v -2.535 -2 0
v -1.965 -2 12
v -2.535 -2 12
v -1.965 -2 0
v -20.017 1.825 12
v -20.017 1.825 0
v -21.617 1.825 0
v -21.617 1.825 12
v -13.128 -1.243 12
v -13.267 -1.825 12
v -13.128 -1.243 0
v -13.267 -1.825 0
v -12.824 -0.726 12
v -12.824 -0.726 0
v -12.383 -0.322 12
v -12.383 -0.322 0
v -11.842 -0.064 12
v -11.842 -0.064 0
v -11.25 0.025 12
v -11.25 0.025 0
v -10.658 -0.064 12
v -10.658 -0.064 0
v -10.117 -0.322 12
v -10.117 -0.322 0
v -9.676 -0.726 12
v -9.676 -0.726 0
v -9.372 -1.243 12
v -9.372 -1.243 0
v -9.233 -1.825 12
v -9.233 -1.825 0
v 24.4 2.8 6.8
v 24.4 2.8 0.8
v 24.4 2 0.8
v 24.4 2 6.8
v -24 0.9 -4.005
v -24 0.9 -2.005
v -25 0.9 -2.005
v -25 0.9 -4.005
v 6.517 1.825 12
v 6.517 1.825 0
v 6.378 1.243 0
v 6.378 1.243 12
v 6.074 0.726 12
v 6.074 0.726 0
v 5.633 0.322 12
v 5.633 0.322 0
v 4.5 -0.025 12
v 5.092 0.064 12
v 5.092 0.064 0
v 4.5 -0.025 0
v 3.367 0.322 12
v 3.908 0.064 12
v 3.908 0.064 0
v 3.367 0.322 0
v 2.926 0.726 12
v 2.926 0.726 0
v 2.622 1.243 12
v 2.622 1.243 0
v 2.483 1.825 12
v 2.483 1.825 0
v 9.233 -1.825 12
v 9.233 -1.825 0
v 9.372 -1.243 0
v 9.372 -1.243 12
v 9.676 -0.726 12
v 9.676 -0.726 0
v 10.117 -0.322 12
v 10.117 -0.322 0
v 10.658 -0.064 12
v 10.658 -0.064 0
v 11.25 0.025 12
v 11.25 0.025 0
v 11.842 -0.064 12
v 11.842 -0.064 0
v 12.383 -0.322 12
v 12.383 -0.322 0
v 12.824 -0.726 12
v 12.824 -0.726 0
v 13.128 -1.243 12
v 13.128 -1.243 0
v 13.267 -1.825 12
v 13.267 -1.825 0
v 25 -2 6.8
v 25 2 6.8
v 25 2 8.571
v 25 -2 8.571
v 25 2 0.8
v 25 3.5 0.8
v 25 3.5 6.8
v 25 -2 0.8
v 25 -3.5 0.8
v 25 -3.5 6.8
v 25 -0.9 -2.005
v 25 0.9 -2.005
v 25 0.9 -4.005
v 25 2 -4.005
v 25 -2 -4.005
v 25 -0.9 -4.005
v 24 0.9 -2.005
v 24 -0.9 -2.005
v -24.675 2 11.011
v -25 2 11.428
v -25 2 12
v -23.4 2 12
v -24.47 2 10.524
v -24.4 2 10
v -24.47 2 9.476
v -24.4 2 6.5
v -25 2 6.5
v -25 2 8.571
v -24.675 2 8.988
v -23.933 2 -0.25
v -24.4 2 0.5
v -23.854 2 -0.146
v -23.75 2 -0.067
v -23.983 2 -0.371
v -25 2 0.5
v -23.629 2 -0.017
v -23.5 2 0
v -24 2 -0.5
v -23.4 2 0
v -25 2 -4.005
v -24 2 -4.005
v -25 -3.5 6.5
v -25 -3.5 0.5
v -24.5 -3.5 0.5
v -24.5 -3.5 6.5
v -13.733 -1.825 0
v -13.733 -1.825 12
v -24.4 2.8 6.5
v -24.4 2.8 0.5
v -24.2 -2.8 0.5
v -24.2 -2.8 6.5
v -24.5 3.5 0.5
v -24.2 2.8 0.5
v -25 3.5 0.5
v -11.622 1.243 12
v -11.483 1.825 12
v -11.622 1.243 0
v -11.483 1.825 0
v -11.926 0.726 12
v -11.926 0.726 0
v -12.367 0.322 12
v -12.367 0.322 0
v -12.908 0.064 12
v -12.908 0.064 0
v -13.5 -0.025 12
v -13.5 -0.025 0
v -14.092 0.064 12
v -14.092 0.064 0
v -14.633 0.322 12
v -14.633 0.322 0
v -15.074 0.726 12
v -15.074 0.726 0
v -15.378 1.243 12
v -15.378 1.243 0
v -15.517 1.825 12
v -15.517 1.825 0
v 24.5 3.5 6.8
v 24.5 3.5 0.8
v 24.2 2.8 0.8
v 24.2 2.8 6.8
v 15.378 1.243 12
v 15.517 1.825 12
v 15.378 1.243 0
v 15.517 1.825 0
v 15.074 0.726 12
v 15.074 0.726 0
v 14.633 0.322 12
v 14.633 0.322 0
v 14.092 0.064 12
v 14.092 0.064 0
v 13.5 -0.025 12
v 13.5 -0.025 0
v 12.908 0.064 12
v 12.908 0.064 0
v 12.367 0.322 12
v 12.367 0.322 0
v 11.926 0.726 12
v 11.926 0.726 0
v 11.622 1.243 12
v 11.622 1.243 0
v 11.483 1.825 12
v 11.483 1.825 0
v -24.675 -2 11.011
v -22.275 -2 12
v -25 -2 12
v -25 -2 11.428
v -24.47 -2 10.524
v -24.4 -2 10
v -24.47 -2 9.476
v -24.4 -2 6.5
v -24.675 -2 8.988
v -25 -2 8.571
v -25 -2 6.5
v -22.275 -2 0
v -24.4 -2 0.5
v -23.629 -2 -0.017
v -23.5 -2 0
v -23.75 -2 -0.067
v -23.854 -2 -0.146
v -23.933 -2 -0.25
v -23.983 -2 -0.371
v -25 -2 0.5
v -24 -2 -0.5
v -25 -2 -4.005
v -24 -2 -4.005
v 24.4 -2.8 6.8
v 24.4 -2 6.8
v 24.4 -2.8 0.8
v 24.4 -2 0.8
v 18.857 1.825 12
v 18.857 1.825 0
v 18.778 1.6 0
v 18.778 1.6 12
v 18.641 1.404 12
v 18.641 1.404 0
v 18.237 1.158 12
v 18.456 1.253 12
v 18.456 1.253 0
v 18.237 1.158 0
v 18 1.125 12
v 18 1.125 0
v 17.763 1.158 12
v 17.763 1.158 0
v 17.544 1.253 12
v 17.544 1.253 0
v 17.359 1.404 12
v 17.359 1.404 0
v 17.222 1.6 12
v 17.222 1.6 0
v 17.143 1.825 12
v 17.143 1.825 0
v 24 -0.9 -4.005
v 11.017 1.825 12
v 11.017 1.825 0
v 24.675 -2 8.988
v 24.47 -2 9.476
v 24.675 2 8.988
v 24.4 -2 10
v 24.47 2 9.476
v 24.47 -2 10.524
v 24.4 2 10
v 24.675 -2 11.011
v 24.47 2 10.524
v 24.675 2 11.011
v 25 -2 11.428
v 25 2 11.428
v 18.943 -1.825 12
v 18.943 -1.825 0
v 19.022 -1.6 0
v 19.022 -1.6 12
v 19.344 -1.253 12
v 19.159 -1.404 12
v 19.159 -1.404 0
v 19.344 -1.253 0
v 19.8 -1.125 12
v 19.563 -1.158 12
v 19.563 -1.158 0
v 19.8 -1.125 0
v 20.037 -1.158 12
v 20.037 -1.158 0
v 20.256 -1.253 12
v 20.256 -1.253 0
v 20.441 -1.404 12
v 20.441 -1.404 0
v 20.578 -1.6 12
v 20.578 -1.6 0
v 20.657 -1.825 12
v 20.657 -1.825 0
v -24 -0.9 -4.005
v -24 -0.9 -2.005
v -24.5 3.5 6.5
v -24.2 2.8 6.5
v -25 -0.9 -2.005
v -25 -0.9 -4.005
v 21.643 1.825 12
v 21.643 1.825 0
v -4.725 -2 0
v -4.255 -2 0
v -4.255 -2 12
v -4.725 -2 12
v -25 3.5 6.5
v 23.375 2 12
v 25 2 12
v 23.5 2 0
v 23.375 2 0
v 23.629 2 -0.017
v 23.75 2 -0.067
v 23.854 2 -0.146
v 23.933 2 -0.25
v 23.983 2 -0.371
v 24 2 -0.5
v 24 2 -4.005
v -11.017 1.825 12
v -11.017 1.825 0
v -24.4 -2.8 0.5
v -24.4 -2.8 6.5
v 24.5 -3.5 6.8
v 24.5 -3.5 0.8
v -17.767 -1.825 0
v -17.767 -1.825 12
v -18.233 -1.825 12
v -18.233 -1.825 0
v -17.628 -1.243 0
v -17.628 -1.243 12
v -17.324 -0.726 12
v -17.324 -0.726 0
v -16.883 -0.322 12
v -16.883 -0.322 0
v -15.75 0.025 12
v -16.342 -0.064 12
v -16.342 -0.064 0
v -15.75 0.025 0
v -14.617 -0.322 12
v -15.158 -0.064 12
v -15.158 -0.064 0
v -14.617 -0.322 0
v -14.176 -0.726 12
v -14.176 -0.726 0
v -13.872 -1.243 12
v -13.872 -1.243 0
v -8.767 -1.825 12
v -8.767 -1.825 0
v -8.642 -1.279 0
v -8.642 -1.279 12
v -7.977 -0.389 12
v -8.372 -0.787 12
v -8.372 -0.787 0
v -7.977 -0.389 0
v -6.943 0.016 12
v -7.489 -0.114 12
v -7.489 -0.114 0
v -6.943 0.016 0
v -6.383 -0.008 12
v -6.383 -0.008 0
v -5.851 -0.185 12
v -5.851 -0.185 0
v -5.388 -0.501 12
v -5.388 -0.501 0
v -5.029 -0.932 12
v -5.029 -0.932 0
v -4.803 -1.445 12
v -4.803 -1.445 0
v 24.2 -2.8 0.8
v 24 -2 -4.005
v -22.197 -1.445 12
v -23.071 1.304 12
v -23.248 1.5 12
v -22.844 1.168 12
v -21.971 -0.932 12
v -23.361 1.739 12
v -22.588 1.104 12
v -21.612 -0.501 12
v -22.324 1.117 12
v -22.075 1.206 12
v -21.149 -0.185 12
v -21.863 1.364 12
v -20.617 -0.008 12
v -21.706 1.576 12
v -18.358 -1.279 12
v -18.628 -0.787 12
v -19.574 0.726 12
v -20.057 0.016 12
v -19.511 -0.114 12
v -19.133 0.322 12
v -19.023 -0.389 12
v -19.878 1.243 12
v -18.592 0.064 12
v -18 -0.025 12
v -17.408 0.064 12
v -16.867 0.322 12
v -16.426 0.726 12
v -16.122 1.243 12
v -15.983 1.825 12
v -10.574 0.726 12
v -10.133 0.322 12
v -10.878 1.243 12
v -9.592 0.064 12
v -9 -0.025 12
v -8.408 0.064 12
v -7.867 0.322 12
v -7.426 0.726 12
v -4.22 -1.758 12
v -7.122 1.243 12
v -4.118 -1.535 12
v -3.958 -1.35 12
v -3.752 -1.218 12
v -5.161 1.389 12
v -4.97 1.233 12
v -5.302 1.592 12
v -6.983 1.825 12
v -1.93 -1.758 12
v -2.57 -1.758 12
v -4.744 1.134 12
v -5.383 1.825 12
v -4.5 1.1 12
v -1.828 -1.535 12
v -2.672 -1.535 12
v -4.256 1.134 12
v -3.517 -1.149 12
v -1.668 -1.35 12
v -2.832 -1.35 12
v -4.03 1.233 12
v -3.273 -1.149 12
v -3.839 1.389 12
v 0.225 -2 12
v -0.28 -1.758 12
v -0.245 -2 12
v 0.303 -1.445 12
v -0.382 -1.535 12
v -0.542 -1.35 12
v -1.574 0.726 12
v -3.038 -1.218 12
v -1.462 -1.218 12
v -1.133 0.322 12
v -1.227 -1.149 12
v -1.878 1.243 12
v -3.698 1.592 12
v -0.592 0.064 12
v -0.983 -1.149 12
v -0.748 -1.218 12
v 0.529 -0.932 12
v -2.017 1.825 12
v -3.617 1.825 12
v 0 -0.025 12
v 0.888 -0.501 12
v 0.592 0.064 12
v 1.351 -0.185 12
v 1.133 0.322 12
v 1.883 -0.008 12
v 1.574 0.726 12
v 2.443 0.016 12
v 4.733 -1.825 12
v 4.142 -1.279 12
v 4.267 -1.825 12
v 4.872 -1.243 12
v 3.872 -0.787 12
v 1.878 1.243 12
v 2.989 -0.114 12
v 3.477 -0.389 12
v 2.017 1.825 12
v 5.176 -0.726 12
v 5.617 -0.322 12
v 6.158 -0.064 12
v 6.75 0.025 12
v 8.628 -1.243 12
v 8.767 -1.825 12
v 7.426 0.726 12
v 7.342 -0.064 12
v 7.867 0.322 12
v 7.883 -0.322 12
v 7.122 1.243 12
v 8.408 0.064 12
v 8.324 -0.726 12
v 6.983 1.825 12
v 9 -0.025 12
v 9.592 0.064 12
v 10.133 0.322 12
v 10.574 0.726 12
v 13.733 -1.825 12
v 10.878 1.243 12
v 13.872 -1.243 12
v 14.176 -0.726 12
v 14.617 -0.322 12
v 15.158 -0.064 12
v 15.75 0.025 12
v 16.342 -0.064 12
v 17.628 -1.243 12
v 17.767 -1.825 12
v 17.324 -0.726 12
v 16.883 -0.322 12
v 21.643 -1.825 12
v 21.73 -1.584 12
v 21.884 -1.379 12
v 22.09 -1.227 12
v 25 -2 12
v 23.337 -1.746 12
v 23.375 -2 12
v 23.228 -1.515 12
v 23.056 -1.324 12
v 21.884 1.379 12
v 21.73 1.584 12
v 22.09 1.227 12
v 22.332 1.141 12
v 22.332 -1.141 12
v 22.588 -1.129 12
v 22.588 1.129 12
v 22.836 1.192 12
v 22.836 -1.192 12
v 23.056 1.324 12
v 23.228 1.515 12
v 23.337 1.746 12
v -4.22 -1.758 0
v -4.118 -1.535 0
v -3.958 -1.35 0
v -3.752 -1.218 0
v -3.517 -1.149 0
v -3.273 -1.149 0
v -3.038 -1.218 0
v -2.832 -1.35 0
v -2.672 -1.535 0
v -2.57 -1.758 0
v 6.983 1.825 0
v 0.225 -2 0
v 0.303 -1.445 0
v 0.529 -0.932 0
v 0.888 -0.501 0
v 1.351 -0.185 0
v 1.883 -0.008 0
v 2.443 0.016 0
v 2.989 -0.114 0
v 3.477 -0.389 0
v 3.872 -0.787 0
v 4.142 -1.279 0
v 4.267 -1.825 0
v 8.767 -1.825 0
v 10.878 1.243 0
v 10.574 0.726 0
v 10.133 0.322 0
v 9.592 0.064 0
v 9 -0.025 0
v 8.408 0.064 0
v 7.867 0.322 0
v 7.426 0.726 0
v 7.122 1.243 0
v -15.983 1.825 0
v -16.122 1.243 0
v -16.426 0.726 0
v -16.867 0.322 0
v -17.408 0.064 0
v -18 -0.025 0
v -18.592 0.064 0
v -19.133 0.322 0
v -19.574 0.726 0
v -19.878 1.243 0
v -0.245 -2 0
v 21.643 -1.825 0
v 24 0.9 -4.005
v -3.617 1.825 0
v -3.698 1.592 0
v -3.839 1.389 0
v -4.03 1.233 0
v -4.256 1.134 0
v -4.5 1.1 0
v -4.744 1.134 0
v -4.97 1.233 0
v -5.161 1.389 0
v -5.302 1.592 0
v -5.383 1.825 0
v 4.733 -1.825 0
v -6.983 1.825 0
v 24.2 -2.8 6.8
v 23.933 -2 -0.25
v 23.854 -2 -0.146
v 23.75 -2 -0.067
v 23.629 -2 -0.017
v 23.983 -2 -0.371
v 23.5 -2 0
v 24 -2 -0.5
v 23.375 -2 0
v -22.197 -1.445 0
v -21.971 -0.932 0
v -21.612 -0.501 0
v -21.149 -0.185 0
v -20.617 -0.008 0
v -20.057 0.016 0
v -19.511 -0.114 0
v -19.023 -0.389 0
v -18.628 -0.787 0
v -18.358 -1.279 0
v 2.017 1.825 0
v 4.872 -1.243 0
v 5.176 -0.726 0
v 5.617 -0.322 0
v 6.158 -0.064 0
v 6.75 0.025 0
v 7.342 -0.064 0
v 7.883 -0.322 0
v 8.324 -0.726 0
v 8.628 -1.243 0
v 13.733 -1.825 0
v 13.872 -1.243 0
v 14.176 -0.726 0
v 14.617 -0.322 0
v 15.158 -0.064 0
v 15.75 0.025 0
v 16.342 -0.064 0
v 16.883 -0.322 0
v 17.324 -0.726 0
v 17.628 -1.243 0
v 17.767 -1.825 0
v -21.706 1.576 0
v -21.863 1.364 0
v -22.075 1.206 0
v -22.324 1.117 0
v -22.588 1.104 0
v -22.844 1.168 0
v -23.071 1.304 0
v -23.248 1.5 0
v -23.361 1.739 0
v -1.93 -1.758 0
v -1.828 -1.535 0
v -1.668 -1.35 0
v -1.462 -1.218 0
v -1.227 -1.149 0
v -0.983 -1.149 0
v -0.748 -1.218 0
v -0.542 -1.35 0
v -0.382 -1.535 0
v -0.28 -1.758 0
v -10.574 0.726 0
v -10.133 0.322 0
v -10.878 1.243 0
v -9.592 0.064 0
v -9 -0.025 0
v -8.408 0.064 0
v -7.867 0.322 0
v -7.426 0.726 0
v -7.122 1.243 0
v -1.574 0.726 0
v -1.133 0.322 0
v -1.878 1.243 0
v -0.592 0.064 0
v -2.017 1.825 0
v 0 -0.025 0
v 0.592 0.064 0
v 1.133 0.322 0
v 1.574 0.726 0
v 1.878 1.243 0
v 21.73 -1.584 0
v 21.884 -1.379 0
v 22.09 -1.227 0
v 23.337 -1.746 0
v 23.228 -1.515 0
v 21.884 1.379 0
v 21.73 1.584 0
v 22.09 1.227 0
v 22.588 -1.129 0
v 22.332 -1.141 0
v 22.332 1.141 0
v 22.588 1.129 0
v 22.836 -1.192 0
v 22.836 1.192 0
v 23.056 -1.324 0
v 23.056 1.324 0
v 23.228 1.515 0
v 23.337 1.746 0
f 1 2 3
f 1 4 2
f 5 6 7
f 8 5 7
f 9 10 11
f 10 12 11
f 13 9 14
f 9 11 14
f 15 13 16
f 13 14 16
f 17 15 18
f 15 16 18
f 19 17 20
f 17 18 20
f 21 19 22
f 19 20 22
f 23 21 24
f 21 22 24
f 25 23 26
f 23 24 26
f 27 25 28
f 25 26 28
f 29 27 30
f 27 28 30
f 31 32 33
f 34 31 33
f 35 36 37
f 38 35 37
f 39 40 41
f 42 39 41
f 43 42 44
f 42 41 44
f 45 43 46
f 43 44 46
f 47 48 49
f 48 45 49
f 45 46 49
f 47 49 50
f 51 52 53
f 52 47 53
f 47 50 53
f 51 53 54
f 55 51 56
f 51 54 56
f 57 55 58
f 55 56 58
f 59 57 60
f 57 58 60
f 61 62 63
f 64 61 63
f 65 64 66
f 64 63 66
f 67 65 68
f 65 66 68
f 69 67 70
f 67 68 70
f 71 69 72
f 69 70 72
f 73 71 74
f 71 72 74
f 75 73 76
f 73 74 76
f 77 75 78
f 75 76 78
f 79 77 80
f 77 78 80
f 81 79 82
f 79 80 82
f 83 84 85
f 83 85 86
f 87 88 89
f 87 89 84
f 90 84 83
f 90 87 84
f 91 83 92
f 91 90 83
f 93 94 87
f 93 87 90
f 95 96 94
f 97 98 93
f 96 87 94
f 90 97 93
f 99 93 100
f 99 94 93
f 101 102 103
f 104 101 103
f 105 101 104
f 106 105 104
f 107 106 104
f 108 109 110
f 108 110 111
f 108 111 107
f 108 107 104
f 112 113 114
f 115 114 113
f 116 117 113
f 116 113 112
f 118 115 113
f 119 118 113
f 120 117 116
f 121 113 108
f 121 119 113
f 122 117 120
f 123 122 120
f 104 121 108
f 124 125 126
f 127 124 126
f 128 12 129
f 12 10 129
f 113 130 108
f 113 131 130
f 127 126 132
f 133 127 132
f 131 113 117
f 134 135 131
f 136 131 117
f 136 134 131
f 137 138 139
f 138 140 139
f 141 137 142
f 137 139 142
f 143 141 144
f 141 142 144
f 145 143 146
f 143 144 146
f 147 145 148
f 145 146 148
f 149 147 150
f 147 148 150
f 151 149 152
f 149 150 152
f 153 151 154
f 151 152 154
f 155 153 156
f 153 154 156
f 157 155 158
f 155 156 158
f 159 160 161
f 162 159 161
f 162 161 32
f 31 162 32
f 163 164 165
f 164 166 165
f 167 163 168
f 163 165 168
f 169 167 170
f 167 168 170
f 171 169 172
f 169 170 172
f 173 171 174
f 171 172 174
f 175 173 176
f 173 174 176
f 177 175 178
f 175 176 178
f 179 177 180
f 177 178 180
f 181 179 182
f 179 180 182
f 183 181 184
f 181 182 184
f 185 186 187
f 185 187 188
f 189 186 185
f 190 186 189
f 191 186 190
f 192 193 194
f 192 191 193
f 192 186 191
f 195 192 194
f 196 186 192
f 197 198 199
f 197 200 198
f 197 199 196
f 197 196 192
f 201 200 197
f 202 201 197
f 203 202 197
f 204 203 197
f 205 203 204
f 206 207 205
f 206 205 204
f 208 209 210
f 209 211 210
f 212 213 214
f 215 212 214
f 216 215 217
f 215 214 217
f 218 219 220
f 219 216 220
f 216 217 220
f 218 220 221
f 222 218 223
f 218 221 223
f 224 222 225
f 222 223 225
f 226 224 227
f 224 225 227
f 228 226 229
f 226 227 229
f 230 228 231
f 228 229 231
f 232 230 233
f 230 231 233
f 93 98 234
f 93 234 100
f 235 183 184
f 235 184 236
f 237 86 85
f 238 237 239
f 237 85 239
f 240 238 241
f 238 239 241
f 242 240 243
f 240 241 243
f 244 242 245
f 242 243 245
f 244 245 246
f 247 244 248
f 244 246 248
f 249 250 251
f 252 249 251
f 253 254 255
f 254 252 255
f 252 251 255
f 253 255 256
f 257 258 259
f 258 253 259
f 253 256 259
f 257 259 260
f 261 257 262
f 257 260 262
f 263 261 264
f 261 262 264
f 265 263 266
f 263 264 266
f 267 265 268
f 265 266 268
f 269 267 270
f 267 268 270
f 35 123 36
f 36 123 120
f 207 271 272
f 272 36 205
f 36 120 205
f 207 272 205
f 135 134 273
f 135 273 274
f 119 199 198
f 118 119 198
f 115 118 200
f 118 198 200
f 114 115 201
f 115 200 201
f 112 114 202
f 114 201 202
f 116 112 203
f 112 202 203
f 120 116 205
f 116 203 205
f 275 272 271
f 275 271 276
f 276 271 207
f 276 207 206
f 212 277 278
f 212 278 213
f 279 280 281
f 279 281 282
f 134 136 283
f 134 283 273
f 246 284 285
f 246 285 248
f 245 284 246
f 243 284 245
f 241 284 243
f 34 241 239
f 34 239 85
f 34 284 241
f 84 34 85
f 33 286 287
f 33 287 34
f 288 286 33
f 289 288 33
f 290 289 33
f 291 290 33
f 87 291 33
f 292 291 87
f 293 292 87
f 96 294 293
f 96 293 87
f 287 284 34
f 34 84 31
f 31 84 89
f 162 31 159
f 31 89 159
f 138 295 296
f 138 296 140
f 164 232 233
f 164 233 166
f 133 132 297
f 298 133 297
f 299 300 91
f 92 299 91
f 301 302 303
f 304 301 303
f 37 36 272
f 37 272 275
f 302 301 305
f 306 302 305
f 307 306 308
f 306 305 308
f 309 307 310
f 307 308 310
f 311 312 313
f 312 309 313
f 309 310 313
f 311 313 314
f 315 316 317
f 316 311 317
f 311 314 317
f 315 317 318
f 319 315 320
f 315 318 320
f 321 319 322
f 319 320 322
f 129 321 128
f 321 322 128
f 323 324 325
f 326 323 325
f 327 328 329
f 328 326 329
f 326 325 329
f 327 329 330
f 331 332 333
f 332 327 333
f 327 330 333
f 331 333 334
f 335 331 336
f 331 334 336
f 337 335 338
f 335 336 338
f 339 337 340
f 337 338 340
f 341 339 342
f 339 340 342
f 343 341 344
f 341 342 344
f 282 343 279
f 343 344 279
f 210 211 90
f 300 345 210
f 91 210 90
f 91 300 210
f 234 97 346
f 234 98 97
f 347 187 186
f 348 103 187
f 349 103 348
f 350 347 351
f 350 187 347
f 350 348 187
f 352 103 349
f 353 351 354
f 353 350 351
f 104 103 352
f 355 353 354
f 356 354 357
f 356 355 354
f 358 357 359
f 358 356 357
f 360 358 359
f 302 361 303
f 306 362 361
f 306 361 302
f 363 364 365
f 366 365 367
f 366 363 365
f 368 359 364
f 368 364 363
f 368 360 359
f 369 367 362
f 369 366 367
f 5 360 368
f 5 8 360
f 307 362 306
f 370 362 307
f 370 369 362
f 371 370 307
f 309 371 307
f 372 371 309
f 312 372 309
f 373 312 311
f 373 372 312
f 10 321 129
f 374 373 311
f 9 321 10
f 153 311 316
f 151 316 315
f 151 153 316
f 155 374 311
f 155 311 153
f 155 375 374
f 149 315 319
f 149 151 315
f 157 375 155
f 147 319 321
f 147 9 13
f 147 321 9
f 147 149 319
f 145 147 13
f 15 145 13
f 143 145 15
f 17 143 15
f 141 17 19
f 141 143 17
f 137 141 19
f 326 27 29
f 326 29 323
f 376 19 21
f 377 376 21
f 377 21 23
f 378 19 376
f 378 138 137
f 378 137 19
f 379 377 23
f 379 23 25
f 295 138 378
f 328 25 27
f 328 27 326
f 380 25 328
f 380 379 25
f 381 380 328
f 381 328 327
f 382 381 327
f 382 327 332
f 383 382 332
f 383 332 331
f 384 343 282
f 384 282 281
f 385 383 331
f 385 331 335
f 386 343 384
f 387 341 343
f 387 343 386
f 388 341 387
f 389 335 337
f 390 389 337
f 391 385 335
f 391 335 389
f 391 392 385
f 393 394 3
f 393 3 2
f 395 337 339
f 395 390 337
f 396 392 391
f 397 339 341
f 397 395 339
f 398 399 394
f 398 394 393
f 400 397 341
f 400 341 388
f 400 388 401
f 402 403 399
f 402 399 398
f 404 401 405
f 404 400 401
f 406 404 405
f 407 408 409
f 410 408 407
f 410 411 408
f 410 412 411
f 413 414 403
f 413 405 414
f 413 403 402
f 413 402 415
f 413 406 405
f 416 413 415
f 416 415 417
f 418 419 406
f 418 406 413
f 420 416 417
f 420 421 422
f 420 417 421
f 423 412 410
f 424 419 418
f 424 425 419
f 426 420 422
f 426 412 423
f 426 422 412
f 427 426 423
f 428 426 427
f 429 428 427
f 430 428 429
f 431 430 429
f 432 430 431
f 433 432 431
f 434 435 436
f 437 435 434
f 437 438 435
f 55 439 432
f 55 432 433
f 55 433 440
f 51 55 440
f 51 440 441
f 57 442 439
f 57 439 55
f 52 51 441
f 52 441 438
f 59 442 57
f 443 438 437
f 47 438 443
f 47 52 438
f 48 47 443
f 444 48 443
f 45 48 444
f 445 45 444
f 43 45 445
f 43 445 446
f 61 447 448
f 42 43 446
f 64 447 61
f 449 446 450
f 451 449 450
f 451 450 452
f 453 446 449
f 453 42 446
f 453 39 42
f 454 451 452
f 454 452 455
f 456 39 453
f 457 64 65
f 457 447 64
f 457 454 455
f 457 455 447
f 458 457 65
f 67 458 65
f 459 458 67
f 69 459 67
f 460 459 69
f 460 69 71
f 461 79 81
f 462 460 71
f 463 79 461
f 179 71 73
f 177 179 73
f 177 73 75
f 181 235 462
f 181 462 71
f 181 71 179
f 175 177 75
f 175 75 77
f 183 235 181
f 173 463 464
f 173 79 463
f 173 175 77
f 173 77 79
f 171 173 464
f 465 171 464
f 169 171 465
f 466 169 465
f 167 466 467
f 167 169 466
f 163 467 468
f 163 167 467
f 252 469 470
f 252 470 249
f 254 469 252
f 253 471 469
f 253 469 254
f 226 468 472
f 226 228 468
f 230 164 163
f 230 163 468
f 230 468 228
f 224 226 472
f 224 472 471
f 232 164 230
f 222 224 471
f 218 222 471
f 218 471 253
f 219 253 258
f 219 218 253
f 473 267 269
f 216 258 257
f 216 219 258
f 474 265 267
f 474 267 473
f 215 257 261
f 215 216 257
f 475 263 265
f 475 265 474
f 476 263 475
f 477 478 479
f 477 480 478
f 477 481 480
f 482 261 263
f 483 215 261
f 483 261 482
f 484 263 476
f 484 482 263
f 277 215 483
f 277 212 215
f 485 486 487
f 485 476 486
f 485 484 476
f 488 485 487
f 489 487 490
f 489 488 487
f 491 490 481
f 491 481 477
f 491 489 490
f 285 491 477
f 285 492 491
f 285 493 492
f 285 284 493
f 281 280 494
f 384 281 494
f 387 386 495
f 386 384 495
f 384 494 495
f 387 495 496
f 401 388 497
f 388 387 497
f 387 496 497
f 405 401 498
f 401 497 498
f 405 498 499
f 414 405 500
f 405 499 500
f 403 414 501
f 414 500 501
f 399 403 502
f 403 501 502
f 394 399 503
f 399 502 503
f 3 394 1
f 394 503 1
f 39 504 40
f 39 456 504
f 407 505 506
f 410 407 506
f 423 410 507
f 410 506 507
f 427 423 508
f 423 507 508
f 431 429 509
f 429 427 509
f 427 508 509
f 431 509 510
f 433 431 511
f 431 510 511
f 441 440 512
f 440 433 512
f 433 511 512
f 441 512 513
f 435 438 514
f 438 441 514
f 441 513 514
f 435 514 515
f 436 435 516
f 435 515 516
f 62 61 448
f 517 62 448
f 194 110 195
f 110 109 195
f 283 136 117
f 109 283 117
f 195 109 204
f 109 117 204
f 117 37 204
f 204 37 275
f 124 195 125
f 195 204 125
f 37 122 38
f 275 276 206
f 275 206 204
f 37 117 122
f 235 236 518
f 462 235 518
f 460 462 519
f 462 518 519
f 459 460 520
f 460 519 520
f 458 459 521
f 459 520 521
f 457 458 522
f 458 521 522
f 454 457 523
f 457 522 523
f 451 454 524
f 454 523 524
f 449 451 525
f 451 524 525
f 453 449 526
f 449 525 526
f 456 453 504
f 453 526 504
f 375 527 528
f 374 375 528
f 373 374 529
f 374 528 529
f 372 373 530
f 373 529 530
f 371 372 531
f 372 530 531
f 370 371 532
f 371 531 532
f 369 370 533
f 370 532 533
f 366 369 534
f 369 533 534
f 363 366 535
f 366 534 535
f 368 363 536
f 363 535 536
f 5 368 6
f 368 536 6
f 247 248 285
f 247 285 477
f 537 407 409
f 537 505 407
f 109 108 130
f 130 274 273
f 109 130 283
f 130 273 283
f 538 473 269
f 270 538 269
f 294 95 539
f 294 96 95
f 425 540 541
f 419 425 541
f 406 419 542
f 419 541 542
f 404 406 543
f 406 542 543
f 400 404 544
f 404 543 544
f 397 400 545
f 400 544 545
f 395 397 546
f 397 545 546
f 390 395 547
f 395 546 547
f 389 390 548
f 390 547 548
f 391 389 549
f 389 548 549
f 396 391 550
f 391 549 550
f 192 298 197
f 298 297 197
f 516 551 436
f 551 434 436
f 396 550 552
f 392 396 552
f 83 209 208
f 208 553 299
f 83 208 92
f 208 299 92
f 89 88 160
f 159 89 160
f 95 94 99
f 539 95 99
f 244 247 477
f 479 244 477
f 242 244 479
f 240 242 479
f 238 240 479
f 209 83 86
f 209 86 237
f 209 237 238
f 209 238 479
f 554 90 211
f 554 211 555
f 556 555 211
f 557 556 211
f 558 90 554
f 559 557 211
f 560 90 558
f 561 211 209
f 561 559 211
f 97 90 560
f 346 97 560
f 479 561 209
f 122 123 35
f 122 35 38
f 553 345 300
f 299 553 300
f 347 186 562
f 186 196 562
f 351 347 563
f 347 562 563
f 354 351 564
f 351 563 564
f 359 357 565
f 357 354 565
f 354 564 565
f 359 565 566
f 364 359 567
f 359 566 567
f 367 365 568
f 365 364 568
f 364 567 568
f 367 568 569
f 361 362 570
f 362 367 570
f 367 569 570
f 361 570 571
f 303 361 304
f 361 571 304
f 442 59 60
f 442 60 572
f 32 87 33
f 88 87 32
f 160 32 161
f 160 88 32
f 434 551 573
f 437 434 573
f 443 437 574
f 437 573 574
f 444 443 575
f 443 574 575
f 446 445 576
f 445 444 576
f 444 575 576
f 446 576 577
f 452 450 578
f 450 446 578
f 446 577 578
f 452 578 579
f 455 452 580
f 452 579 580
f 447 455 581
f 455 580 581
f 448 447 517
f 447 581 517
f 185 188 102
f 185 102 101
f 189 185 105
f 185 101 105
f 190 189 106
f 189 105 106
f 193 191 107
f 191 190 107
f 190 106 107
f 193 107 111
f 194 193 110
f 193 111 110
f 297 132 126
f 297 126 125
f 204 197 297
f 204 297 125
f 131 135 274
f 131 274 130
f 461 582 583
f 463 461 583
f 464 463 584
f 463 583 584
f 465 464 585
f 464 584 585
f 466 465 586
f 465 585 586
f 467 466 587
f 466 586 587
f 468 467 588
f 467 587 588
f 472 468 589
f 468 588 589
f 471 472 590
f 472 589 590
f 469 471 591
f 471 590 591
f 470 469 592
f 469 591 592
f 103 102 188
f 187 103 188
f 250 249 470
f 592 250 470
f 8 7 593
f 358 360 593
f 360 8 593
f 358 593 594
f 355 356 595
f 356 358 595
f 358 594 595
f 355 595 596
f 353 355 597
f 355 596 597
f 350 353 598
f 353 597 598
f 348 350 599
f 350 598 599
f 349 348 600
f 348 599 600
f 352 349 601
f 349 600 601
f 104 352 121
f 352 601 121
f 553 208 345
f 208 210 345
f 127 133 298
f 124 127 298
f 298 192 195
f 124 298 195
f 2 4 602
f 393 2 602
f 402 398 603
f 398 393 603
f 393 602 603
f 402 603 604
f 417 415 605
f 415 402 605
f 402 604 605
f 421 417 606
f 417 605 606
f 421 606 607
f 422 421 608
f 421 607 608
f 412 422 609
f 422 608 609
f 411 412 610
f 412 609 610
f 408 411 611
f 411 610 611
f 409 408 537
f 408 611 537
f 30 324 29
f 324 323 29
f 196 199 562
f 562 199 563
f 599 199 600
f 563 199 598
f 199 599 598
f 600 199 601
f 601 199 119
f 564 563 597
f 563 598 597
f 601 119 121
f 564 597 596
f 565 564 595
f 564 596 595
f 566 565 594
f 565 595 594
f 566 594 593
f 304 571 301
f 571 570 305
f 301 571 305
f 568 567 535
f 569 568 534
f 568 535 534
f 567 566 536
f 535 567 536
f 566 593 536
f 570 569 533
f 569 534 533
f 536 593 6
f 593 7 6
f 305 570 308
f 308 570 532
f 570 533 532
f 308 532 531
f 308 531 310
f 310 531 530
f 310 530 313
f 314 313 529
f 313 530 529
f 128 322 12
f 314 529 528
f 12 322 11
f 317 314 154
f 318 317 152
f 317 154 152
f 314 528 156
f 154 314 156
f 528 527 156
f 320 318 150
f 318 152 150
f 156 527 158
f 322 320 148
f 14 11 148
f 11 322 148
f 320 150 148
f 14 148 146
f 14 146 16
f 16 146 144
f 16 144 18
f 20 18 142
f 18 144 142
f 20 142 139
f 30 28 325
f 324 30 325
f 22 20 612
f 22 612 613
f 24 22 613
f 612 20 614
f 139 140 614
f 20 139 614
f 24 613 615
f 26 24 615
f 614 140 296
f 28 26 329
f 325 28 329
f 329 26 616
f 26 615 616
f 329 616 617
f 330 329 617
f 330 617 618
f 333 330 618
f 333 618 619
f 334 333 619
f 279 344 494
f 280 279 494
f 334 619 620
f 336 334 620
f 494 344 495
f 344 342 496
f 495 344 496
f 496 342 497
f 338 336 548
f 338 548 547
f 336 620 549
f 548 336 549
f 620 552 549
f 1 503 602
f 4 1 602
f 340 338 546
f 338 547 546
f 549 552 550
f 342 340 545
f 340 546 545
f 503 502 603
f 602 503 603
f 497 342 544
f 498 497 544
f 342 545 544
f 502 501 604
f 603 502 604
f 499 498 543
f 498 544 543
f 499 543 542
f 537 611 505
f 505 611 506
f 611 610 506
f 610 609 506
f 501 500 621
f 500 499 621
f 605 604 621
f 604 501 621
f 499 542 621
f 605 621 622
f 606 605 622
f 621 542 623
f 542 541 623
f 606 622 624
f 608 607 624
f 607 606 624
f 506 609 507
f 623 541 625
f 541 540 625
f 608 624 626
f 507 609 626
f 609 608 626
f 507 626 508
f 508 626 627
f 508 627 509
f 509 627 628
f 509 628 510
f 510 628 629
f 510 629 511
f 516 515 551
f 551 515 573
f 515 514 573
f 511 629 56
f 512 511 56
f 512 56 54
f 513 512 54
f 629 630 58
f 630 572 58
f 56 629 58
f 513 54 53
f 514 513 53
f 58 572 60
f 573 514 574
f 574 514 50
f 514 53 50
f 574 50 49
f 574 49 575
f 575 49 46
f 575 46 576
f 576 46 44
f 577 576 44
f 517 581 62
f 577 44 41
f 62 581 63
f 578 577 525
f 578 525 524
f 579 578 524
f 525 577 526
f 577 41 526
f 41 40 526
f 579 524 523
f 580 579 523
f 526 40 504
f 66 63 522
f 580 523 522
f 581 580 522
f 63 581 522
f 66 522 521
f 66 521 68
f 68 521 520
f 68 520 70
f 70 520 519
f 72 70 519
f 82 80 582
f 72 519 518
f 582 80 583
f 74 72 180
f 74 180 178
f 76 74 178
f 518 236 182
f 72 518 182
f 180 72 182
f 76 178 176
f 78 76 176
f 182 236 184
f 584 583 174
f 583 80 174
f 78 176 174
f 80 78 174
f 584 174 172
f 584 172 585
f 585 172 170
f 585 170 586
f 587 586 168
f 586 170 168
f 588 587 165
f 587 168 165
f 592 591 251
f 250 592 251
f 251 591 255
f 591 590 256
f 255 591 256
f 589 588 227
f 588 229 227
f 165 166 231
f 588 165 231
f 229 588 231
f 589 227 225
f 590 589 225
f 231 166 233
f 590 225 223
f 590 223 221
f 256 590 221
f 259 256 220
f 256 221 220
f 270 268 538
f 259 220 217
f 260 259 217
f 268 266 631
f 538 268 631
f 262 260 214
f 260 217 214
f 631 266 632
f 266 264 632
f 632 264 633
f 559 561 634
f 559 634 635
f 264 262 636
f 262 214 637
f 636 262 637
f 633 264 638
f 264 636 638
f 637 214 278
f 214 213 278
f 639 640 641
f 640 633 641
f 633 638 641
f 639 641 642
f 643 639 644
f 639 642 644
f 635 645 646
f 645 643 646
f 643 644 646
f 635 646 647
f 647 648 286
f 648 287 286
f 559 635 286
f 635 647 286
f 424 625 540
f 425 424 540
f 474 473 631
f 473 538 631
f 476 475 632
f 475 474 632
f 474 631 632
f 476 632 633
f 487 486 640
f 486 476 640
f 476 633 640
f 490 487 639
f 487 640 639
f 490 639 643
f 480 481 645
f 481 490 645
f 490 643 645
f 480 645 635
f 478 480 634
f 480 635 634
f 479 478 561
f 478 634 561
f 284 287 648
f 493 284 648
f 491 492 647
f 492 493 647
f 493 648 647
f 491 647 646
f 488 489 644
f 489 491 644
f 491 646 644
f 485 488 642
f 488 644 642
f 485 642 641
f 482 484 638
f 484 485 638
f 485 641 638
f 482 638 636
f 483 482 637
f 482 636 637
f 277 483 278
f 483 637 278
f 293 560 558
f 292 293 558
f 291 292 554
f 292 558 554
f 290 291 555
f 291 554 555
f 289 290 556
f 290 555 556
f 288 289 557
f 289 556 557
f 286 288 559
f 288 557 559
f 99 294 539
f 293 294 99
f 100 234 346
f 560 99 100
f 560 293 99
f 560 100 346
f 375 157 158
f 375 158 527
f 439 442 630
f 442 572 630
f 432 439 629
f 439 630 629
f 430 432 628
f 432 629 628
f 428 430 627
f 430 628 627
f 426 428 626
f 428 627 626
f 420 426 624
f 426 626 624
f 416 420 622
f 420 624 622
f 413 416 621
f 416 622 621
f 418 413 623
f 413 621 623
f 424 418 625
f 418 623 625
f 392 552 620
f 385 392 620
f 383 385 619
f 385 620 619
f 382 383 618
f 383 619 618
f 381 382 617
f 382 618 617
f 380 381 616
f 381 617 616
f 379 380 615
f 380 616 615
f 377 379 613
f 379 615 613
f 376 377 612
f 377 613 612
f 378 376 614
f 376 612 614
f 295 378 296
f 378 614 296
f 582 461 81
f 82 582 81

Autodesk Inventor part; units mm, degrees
sketch "Sketch1" plane through (0, 0, 0) normal (0, 0, 1) x (1, 0, 0)
  line L0 (-25, 2) -> (-25, -2)
  line L1 (0, 0.3189) -> (0, -1.0844) construction
  line L2 (-25, 2) -> (25, 2)
  line L3 (25, 2) -> (25, -2)
  line L4 (25, -2) -> (-25, -2)
  line L5 (-1.8046, 0) -> (4.5195, 0) construction
  arc A0 (-23.4, 2) -> (-21.6, 2) centre (-22.5, 2) ccw
  arc A1 (-20.025, 2) -> (-15.975, 2) centre (-18, 2) ccw
  arc A2 (-15.525, 2) -> (-11.475, 2) centre (-13.5, 2) ccw
  arc A3 (-11.025, 2) -> (-6.975, 2) centre (-9, 2) ccw
  arc A4 (-5.4, 2) -> (-3.6, 2) centre (-4.5, 2) ccw
  arc A5 (-2.025, 2) -> (2.025, 2) centre (0, 2) ccw
  arc A6 (2.475, 2) -> (6.525, 2) centre (4.5, 2) ccw
  arc A7 (6.975, 2) -> (11.025, 2) centre (9, 2) ccw
  arc A8 (11.475, 2) -> (15.525, 2) centre (13.5, 2) ccw
  arc A9 (17.125, 2) -> (18.875, 2) centre (18, 2) ccw
  arc A10 (21.625, 2) -> (23.375, 2) centre (22.5, 2) ccw
  arc A11 (-18.225, -2) -> (-22.275, -2) centre (-20.25, -2) ccw
  arc A12 (-13.725, -2) -> (-17.775, -2) centre (-15.75, -2) ccw
  arc A13 (-9.225, -2) -> (-13.275, -2) centre (-11.25, -2) ccw
  arc A14 (-4.725, -2) -> (-8.775, -2) centre (-6.75, -2) ccw
  arc A15 (-2.535, -2) -> (-4.255, -2) centre (-3.395, -2) ccw
  arc A16 (-0.245, -2) -> (-1.965, -2) centre (-1.105, -2) ccw
  arc A17 (4.275, -2) -> (0.225, -2) centre (2.25, -2) ccw
  arc A18 (8.775, -2) -> (4.725, -2) centre (6.75, -2) ccw
  arc A19 (13.275, -2) -> (9.225, -2) centre (11.25, -2) ccw
  arc A20 (17.775, -2) -> (13.725, -2) centre (15.75, -2) ccw
  arc A21 (20.675, -2) -> (18.925, -2) centre (19.8, -2) ccw
  arc A22 (23.375, -2) -> (21.625, -2) centre (22.5, -2) ccw
  point P0 (0, 0)
  dimension "d0" = 4
  dimension "d1" = 50
  dimension "d2" = 2.5
  dimension "d3" = 4.5
  dimension "d4" = 4.5
  dimension "d5" = 4.5
  dimension "d6" = 4.5
  dimension "d7" = 4.5
  dimension "d8" = 4.5
  dimension "d10" = 4.5
  dimension "d11" = 4.5
  dimension "d12" = 4.5
  dimension "d13" = 4.5
  dimension "d14" = 1.8
  dimension "d15" = 4.05
  dimension "d16" = 4.05
  dimension "d17" = 4.05
  dimension "d18" = 1.8
  dimension "d19" = 4.05
  dimension "d20" = 4.05
  dimension "d21" = 4.05
  dimension "d22" = 4.05
  dimension "d23" = 1.75
  dimension "d24" = 1.75
  dimension "d25" = 4.05
  dimension "d27" = 4.5
  dimension "d28" = 4.5
  dimension "d29" = 4.5
  dimension "d30" = 3.355
  dimension "d31" = 2.29
  dimension "d32" = 3.355
  dimension "d33" = 4.5
  dimension "d34" = 4.5
  dimension "d35" = 4.5
  dimension "d37" = 1.75
  dimension "d38" = 4.05
  dimension "d39" = 4.05
  dimension "d40" = 4.05
  dimension "d41" = 4.05
  dimension "d42" = 1.72
  dimension "d43" = 1.72
  dimension "d44" = 4.05
  dimension "d45" = 4.05
  dimension "d46" = 4.05
  dimension "d47" = 1.75
  dimension "d48" = 2.7
  dimension "d136" = 2.5
  dimension "d143" = 4.05
extrude "Extrusion1" add sketch "Sketch1" along normal blind 12 contours L2 A0 A1 A2 A3 A4 A5 A6 A7 A8 A9 A10 L3 L4 A22 A21 A20 A19 A18 A17 A16 A15 A14 A13 A12 A11 L0
sketch "Sketch2" plane through (23.375, 2, 0) normal (0, 1, 0) x (1, 0, 0)
  circle A0 centre (3.025, -9.9997) radius 2
  line L0 (1.625, 0) -> (1.625, -12) projected
  line L1 (1.625, -12) -> (1.625, -11.428)
  point P0 (-23.375, 0)
  dimension "d51" = 4
  dimension "d52" = 0.572
  dimension "d55" = 1.4
extrude "Extrusion2" cut sketch "Sketch2" against normal blind 12.5
sketch "Sketch3" plane through (-25, 2, 0) normal (0, 1, 0) x (1, 0, 0)
  circle A0 centre (-1.4, -9.9997) radius 2
  line L0 (0, 0) -> (0, -12) projected
  line L1 (0, -12) -> (0, -11.428)
  point P0 (25, 0)
  dimension "d58" = 4
  dimension "d59" = 0.572
  dimension "d60" = 1.4
extrude "Extrusion3" cut sketch "Sketch3" against normal blind 12.5
sketch "Sketch4" plane through (0, 0, 12) normal (0, 0, 1) x (1, 0, 0)
  line L0 (-22.4782, 2) -> (21.8218, 2)
  line L1 (21.8218, 2) -> (21.8218, 1.825)
  line L2 (21.8218, 1.825) -> (-22.4782, 1.825)
  line L3 (-22.4782, 1.825) -> (-22.4782, 2)
  line L4 (-20.025, 2) -> (-21.6, 2) projected
  line L5 (-25, 2) -> (-25, -2) projected
  line L6 (13.275, -2) -> (13.725, -2) projected
  line L7 (-21.5, -2) -> (-8, -2)
  line L8 (-8, -2) -> (-8, -1.825)
  line L9 (-8, -1.825) -> (-21.5, -1.825)
  line L10 (-21.5, -1.825) -> (-21.5, -2)
  line L11 (0.89, -2) -> (21.8842, -2)
  line L12 (21.8842, -2) -> (21.8842, -1.825)
  line L13 (21.8842, -1.825) -> (0.89, -1.825)
  line L14 (0.89, -1.825) -> (0.89, -2)
  line L15 (-13.725, -2) -> (-13.275, -2) projected
  line L16 (25, -2) -> (25, 2) projected
  point P0 (0, 0)
  point P1 (-20.8125, 2)
  point P2 (13.5, -2)
  point P3 (-13.5, -2)
  dimension "d63" = 0.175
  dimension "d64" = 44.3
  dimension "d65" = 2.5218
  dimension "d69" = 0.175
  dimension "d70" = 0.175
  dimension "d71" = 3.5
  dimension "d72" = 17
  dimension "d73" = 3.1158
  dimension "d74" = 24.11
extrude "Extrusion4" cut sketch "Sketch4" against normal blind 12.5
ref_plane "Work Plane1" through (0, 0, 0.5) normal (0, 0, -1) x (-1, 0, 0)
sketch "Sketch5" plane through (0, 0, 0.5) normal (0, 0, -1) x (-1, 0, 0)
  line L0 (25, 2) -> (25, -2) projected
  line L1 (25, 2) -> (25, 3.5)
  line L2 (25, 3.5) -> (24.5, 3.5)
  line L3 (24.5, 3.5) -> (24.1998, 2.7996)
  line L4 (24.1998, 2.7996) -> (24.3998, 2.7996)
  line L5 (24.3998, 2.7996) -> (24.3998, 2)
  line L6 (23.4, 2) -> (25, 2) projected
  line L7 (25, -2) -> (22.275, -2) projected
  line L8 (25, -2) -> (25, -3.5)
  line L9 (25, -3.5) -> (24.5, -3.5)
  line L10 (24.5, -3.5) -> (24.1998, -2.7996)
  line L11 (24.1998, -2.7996) -> (24.3998, -2.7996)
  line L12 (24.3998, -2.7996) -> (24.3998, -2)
  line L13 (0, 0) -> (0, 7.5844) construction
  line L14 (25, 2) -> (24.3998, 2)
  line L15 (25, -2) -> (24.3998, -2)
  line L16 (-25, 2) -> (-25, -2)
  line L17 (-25, 2) -> (-25, 3.5)
  line L18 (-25, 3.5) -> (-24.5, 3.5)
  line L19 (-24.5, 3.5) -> (-24.1998, 2.7996)
  line L20 (-24.1998, 2.7996) -> (-24.3998, 2.7996)
  line L21 (-24.3998, 2.7996) -> (-24.3998, 2)
  line L22 (-23.4, 2) -> (-25, 2)
  line L23 (-25, -2) -> (-22.275, -2)
  line L24 (-25, -2) -> (-25, -3.5)
  line L25 (-25, -3.5) -> (-24.5, -3.5)
  line L26 (-24.5, -3.5) -> (-24.1998, -2.7996)
  line L27 (-24.1998, -2.7996) -> (-24.3998, -2.7996)
  line L28 (-24.3998, -2.7996) -> (-24.3998, -2)
  line L29 (-25, 2) -> (-24.3998, 2)
  line L30 (-25, -2) -> (-24.3998, -2)
  dimension "d78" = 1.5
  dimension "d79" = 0.5
  dimension "d80" = 0.762
  dimension "d81" = 0.2
  dimension "d83" = 113.2
  dimension "d84" = 0.7996
  dimension "d85" = 1.5
  dimension "d86" = 0.5
  dimension "d87" = 113.2
  dimension "d88" = 0.2
  dimension "d89" = 0.762
extrude "Extrusion5" add sketch "Sketch5" against normal blind 6 contours L8 L9 L10 L11 L12 L7 | L6 L5 L4 L3 L2 L1
ref_plane "Work Plane2" through (0, 0, 0.8) normal (0, 0, -1) x (-1, 0, 0)
sketch "Sketch8" plane through (0, 0, 0.8) normal (0, 0, -1) x (-1, 0, 0)
  line L0 (25, 2) -> (25, 3.5)
  line L1 (25, 3.5) -> (24.5, 3.5)
  line L2 (24.5, 3.5) -> (24.1998, 2.7996)
  line L3 (24.1998, 2.7996) -> (24.3998, 2.7996)
  line L4 (24.3998, 2.7996) -> (24.3998, 2)
  line L5 (24.25, 2) -> (25, 2)
  line L6 (25, 2) -> (24.3998, 2)
  arc A0 (-2.0174, 1.825) -> (2.0174, 1.825) centre (0, 2) ccw projected
  line L7 (0, 2) -> (0, 7.911) construction
  line L8 (-24.25, 2) -> (-25, 2)
  line L9 (-25, 2) -> (-24.3998, 2)
  line L10 (-24.1998, 2.7996) -> (-24.3998, 2.7996)
  line L11 (-24.3998, 2.7996) -> (-24.3998, 2)
  line L12 (-25, 2) -> (-25, 3.5)
  line L13 (-25, 3.5) -> (-24.5, 3.5)
  line L14 (-24.5, 3.5) -> (-24.1998, 2.7996)
  point P0 (0, 0)
  dimension "d112" = 1.5
  dimension "d113" = 0.5
  dimension "d114" = 0.762
  dimension "d115" = 0.2
  dimension "d116" = 113.2
  dimension "d117" = 0.7996
extrude "Extrusion8" add sketch "Sketch8" against normal blind 6 contours L8 L12 L13 L14 L10 L11
mirror "Mirror1" about plane through (0, 0, 0) normal (0, 1, 0) of "Extrusion8"
ref_plane "Work Plane3" through (0, 0, 1.3) normal (0, 0, -1) x (-1, 0, 0)
sketch "Sketch11" plane through (0, 0, 0) normal (0, 0, -1) x (-1, 0, 0)
  line L0 (-25, 2) -> (-24.4, 2) projected
  line L1 (-23.375, -2) -> (-25, -2) projected
  line L2 (-25, 2) -> (-24, 2)
  line L3 (-24, 2) -> (-24, -2)
  line L4 (-24, -2) -> (-25, -2)
  line L5 (-25, -2) -> (-25, 2)
  line L6 (25, 2) -> (25, -2) projected
  line L7 (25, -2) -> (22.275, -2) projected
  line L8 (25, 2) -> (24, 2)
  line L9 (24, 2) -> (24, -2)
  line L10 (24, -2) -> (25, -2)
  line L11 (25, -2) -> (25, 2)
  point P0 (0, 0)
  dimension "d145" = 1
  dimension "d146" = 1
extrude "Extrusion11" add sketch "Sketch11" along normal blind 2.005
fillet "Fillet1" radius 0.5 2 edges at (24, 0, 0) (-24, 0, 0)
sketch "Sketch12" plane through (0, 0, -2.005) normal (0, 0, -1) x (-1, 0, 0)
  line L0 (-25, 2) -> (-25, -2) projected
  line L1 (-24, -2) -> (-24, 2) projected
  line L2 (-25, 0.9) -> (-24, 0.9)
  line L3 (-24, 0.9) -> (-24, -0.8147)
  line L4 (-24, -0.8147) -> (-25, -0.8147)
  line L5 (-25, -0.8147) -> (-25, 0.9)
  line L6 (-24, 2) -> (-25, 2) projected
  line L7 (-23.375, -2) -> (-25, -2) projected
  line L8 (-25, -2) -> (-24, -2)
  line L9 (-24, -2) -> (-24, -0.9)
  line L10 (-24, -0.9) -> (-25, -0.9)
  line L11 (-25, -0.9) -> (-25, -2)
  line L12 (25, -2) -> (25, 2) projected
  line L13 (25, 2) -> (24, 2)
  line L14 (24, 2) -> (24, 0.9)
  line L15 (24, 0.9) -> (25, 0.9)
  line L16 (25, 0.9) -> (25, 2)
  line L17 (25, -2) -> (25, -3.5) projected
  line L18 (25, -2) -> (24, -2)
  line L19 (24, -2) -> (24, -0.9)
  line L20 (24, -0.9) -> (25, -0.9)
  line L21 (25, -0.9) -> (25, -2)
  point P0 (0, 0)
  dimension "d150" = 1.1
  dimension "d151" = 1.1
  dimension "d152" = 1
  dimension "d153" = 1.1
  dimension "d154" = 1
  dimension "d155" = 1.1
extrude "Extrusion12" add sketch "Sketch12" along normal blind 2 contours L6 L1 L2 L0 | L4 L1 L10 L0 | L10 L1 L7 L0 | L18 L19 L20 L12 | L15 L14 L13 L12
sketch "Sketch13" plane through (25, -2, 8.5714) normal (1, 0, 0) x (0, 0, -1)
  line L0 (12.5764, 0) -> (12.5764, 1.1853) projected
  line L1 (12.5764, 1.1853) -> (10.5764, 1.1853)
  line L2 (12.5764, 1.2003) -> (12.5764, 1.1853)
  line L3 (119.9448, 1.2) -> (10.5764, 1.2) construction
  line L4 (10.5764, 1.2) -> (12.5764, 1.2)
  line L5 (12.5764, 1.2) -> (12.5764, 1.1)
  line L6 (12.5764, 1.1) -> (10.5764, 1.1)
  line L7 (10.5764, 1.1) -> (10.5764, 1.2)
  point P0 (8.5714, 2)
  dimension "d159" = 0.1
extrude "Extrusion13" cut sketch "Sketch13" against normal blind 10
properties part number "3d_LM - Pinza 3" material "PA12 SLS 3D Print"
